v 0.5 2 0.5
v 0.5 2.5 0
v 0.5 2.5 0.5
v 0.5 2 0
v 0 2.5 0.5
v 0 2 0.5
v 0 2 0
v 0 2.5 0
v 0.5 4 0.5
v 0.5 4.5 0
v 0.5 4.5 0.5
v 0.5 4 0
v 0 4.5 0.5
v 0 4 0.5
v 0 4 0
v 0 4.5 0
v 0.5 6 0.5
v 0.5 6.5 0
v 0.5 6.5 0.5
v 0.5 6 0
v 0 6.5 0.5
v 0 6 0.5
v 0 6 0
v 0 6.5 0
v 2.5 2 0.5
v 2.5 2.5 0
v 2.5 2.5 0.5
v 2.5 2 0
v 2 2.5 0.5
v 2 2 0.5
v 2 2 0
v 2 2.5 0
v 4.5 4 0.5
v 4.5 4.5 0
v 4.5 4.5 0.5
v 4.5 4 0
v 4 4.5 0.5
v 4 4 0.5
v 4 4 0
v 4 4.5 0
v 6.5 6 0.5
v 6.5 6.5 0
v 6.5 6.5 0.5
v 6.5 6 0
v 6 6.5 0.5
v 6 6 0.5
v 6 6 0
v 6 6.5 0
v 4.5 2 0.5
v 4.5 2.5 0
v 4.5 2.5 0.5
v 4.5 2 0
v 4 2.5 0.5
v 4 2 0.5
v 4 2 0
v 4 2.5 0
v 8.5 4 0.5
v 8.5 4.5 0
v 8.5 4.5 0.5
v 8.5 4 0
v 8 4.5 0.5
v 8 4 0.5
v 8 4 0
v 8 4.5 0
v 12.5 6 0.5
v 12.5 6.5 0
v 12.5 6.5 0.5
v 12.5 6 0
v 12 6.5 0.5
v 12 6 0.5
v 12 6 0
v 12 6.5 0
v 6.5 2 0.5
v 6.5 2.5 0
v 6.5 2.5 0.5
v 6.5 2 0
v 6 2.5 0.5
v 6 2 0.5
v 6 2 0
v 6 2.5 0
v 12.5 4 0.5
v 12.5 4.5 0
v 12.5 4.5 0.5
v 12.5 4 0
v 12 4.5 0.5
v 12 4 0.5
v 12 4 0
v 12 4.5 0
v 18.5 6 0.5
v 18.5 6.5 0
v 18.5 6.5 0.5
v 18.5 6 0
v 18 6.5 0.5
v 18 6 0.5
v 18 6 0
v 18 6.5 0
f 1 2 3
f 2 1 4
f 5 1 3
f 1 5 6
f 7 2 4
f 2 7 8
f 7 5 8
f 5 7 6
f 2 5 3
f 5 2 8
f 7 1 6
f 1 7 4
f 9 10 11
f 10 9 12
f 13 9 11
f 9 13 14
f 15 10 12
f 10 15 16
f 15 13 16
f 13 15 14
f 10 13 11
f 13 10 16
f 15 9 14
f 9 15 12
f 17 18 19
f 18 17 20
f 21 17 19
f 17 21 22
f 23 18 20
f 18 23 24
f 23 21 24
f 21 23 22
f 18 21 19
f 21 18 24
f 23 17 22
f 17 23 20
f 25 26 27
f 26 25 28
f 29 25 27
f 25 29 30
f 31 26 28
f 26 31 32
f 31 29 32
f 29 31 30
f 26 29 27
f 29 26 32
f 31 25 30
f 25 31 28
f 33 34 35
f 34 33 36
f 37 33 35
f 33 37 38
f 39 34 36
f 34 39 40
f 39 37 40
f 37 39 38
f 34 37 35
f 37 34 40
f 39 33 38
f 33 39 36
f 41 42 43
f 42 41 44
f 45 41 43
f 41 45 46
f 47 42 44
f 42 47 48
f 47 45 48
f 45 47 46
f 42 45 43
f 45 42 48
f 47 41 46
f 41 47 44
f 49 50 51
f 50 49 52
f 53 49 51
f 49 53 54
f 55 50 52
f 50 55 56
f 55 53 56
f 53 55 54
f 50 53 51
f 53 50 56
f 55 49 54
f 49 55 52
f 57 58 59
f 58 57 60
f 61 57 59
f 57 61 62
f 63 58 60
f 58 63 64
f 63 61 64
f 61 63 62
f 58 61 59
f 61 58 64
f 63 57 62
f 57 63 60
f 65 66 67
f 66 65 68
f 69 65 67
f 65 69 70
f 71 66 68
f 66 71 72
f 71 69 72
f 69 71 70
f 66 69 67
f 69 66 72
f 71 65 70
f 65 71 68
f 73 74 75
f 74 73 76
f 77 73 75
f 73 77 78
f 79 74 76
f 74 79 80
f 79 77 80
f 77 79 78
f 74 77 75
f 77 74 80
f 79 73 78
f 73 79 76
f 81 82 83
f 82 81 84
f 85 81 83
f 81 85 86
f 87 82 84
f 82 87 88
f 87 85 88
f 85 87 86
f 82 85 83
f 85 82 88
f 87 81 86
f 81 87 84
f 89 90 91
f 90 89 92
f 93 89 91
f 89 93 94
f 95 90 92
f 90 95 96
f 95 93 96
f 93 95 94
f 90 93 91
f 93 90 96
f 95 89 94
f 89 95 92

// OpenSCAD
for (xpos=[0:3], ypos = [2,4,6]) {
	translate([xpos*ypos, ypos, 0])
	cube([0.5, 0.5, 0.5]);
}
